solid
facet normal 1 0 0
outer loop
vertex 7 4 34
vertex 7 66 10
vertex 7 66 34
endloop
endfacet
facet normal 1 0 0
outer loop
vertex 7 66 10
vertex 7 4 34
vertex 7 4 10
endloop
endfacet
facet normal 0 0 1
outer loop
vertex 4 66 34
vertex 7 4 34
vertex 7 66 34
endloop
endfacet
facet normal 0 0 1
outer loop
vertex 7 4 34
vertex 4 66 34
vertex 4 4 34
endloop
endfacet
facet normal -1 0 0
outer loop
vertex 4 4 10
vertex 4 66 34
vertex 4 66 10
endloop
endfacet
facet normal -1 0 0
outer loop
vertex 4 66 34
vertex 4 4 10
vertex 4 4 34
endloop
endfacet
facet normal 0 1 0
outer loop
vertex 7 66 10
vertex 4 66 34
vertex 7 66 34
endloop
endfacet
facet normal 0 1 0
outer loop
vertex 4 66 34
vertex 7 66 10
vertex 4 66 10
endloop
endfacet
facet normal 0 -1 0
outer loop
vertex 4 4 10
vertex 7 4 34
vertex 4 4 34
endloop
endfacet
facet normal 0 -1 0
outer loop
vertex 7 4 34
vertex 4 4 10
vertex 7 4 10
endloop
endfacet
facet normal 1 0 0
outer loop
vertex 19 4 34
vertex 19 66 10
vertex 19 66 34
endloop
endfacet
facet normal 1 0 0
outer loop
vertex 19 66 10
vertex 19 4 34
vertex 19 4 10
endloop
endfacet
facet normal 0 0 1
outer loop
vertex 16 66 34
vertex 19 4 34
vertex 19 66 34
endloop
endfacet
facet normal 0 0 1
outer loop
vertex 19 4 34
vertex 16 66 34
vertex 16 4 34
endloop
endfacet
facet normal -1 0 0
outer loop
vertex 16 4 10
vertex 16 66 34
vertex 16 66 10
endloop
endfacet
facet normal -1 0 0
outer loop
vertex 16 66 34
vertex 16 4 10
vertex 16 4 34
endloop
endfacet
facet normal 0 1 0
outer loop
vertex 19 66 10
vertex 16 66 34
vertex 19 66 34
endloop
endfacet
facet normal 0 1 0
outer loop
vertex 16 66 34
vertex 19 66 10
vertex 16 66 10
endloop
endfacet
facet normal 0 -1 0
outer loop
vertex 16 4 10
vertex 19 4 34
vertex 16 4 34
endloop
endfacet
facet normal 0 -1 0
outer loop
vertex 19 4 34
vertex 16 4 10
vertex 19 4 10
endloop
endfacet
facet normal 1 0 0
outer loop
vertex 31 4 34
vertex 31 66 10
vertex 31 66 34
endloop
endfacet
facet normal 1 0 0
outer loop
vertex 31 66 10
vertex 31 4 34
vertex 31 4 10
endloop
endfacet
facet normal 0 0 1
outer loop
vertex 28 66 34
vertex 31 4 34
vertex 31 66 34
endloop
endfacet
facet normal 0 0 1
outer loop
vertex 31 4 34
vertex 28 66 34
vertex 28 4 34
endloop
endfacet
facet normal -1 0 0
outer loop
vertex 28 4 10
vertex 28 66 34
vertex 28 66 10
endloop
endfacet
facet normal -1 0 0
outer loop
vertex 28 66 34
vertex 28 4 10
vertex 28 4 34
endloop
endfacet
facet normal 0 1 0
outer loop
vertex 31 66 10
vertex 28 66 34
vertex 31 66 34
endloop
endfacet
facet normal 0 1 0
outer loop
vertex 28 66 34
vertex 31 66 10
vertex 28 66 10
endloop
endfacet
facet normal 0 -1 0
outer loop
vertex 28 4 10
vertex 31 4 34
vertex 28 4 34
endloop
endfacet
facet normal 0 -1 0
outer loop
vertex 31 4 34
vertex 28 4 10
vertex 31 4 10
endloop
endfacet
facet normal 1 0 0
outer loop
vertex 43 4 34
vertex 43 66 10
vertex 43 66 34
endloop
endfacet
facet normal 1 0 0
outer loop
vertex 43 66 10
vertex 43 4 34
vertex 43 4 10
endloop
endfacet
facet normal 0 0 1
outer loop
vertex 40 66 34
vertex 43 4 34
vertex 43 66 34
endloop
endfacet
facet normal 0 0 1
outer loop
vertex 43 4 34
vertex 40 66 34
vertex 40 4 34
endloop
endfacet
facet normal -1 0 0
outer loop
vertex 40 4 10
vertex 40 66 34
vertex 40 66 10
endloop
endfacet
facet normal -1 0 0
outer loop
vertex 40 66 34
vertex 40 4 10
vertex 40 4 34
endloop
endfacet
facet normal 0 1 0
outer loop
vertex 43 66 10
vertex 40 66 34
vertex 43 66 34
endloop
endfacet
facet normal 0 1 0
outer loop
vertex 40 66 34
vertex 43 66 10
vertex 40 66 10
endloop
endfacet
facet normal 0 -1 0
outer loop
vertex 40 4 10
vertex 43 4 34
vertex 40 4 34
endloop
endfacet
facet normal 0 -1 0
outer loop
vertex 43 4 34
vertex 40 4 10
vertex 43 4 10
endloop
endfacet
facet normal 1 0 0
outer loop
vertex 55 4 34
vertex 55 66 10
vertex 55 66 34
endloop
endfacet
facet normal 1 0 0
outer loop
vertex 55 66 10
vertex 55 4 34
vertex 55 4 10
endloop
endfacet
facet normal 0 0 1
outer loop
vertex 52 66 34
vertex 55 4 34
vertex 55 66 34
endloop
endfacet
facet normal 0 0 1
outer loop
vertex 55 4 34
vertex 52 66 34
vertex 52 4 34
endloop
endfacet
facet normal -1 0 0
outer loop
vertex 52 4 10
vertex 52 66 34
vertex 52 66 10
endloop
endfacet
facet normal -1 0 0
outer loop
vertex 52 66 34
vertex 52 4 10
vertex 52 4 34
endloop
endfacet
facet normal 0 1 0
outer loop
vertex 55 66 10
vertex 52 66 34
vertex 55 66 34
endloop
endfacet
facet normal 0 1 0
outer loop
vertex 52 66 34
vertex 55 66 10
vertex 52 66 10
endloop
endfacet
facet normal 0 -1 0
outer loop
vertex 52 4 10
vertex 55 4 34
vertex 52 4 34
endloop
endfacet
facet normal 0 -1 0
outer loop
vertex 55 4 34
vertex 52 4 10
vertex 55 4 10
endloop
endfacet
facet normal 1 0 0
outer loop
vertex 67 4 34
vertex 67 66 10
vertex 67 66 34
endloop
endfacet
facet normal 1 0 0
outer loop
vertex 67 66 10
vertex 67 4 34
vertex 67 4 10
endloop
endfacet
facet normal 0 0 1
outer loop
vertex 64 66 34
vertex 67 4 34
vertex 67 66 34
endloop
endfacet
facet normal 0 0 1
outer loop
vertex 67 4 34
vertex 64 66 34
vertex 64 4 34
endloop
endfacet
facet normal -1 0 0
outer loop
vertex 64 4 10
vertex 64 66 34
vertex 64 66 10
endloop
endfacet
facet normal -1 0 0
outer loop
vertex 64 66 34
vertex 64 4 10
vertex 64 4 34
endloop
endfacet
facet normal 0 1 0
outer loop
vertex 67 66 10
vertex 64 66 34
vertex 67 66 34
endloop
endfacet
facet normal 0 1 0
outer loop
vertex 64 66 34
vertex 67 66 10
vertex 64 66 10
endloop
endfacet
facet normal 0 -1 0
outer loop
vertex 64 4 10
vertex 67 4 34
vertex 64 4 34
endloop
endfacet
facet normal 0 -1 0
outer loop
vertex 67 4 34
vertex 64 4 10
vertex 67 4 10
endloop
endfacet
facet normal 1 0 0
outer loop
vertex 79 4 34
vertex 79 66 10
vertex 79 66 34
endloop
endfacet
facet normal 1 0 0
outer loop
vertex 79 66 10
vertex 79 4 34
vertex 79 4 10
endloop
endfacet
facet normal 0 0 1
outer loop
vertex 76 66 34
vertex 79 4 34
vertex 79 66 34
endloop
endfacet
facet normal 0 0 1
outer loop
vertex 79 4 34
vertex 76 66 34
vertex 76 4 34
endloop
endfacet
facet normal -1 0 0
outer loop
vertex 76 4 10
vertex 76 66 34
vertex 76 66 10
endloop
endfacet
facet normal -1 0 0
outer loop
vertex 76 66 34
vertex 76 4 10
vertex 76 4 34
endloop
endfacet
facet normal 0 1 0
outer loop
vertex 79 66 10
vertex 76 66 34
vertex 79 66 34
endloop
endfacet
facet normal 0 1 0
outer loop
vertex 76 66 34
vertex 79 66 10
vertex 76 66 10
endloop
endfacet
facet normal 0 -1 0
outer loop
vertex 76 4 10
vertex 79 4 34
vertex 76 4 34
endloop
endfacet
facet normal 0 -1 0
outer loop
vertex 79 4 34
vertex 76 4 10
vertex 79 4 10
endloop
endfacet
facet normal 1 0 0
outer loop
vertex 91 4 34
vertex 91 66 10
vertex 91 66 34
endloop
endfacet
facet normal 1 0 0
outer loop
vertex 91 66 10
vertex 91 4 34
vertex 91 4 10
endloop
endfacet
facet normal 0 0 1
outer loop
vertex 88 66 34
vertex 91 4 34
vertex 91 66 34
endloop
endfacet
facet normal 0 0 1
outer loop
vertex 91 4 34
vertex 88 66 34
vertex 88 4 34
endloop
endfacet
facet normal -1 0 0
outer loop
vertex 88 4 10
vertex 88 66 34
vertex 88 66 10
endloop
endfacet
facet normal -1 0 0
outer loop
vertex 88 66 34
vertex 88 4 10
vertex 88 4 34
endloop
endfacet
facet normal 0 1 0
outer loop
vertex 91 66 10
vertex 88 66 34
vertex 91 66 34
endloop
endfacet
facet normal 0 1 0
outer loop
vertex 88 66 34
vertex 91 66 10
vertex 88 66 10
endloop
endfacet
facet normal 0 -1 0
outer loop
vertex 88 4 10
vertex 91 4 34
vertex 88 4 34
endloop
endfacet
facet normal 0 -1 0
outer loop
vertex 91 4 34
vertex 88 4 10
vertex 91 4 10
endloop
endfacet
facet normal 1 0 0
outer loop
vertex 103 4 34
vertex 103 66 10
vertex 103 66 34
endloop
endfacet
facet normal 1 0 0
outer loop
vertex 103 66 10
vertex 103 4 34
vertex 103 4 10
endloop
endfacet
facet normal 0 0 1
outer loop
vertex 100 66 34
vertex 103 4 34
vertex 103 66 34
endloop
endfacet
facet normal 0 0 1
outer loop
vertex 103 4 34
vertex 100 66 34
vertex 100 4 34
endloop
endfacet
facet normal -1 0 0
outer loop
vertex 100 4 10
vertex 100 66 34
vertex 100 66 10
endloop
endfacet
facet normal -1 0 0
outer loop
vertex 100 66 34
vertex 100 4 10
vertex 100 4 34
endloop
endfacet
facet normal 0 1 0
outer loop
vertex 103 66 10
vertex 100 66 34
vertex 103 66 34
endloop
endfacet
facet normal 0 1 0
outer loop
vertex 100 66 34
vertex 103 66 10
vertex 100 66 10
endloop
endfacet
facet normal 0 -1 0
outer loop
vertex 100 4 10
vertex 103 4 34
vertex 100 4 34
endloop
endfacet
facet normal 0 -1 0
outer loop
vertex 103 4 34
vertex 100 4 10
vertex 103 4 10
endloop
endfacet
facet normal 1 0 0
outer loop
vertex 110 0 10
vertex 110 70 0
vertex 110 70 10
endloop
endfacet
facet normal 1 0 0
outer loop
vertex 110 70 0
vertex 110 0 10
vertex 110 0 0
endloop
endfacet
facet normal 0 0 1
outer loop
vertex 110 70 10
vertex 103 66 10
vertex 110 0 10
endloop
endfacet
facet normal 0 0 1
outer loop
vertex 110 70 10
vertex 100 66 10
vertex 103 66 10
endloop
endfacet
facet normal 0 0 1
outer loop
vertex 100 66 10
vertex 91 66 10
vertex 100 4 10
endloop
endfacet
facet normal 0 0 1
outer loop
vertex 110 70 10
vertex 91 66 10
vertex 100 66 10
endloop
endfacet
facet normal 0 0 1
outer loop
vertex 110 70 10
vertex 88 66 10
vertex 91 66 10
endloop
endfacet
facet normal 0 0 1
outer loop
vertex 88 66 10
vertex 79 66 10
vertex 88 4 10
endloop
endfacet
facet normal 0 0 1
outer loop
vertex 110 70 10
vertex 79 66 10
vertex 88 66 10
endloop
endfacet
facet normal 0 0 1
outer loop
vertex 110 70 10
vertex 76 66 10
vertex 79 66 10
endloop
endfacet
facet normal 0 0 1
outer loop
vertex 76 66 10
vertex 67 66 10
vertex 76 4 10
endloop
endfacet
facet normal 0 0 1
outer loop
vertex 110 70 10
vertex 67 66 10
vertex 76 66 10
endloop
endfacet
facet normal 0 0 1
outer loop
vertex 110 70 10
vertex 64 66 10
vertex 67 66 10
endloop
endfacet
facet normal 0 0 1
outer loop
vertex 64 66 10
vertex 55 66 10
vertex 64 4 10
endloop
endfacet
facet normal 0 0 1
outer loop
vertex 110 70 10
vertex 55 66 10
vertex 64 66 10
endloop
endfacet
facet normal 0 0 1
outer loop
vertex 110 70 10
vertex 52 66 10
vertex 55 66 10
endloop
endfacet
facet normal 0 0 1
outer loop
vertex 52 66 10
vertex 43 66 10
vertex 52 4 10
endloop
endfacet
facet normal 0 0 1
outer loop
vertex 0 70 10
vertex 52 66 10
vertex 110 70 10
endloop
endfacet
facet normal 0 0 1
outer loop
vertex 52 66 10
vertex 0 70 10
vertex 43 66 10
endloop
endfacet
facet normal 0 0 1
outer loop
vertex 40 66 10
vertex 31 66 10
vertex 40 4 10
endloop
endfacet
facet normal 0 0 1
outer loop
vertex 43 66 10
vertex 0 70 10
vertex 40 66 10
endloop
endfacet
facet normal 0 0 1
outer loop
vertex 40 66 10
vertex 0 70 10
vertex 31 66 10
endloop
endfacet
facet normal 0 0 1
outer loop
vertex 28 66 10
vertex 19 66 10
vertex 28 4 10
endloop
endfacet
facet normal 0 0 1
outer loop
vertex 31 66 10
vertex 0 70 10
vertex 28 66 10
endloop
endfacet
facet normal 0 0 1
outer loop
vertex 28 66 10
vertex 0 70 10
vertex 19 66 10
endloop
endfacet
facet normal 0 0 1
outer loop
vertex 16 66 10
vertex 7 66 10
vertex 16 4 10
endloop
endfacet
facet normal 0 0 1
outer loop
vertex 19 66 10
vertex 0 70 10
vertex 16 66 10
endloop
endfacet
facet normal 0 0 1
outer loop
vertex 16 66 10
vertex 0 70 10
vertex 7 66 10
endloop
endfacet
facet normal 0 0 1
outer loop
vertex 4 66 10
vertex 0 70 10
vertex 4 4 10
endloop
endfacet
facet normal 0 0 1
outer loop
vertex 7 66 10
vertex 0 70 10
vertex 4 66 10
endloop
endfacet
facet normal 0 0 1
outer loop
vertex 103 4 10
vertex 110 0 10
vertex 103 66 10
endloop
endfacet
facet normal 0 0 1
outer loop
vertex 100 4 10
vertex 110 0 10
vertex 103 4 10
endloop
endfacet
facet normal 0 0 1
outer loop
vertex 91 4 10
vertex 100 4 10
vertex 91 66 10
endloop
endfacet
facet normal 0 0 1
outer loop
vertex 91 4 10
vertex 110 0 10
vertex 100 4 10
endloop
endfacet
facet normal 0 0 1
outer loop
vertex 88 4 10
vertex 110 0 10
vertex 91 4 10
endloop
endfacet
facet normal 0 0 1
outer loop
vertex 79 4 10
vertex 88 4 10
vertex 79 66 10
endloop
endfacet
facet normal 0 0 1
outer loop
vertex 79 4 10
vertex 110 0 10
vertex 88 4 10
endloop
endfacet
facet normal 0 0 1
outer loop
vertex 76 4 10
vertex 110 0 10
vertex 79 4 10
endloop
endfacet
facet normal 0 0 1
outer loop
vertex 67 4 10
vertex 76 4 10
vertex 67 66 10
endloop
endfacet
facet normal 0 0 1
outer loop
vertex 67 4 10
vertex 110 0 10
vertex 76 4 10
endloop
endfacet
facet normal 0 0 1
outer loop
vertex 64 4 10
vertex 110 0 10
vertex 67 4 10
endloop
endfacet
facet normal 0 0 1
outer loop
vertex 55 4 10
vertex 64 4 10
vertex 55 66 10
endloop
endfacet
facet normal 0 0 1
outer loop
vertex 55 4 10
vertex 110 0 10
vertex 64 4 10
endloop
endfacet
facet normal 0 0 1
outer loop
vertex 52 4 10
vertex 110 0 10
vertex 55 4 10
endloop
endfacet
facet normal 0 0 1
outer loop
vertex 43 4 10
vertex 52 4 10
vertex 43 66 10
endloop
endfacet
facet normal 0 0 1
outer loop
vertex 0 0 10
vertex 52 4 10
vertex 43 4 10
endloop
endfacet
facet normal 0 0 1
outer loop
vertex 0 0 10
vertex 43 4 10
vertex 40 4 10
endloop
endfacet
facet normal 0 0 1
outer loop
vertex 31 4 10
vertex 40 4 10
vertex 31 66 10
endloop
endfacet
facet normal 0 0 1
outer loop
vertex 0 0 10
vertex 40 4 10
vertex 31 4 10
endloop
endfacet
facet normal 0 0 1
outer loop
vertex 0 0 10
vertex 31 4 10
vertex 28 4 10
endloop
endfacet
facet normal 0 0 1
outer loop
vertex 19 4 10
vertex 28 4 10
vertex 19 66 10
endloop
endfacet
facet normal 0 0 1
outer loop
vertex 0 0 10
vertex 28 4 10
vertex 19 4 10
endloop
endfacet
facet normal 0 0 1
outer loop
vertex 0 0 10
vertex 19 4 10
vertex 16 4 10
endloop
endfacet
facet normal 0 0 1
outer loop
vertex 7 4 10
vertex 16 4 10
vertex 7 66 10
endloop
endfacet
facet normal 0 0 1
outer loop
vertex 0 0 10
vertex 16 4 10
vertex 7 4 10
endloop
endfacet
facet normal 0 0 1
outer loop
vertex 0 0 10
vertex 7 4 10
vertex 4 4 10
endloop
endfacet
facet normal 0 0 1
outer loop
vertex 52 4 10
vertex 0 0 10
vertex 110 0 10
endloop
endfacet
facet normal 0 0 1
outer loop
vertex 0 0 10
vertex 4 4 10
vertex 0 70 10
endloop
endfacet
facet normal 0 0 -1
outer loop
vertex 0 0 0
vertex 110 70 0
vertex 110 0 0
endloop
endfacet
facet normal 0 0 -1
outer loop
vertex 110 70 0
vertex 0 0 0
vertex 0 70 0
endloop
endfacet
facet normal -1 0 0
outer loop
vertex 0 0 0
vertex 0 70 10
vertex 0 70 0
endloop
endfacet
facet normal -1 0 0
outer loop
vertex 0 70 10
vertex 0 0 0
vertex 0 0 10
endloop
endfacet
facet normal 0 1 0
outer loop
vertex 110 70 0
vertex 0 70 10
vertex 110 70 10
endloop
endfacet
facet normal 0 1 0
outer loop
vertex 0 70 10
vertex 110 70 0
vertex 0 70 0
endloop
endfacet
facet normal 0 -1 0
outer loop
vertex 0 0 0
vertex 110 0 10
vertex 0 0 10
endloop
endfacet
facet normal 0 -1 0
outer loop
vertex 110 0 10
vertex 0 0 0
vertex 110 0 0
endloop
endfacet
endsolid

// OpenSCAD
$fn = 32;

// ----------------------------------------------------------------------
// Heatsink: uniform fin block
// ----------------------------------------------------------------------

// --- parameters (mm) ---
base_l = 110;             // base length, X
base_w = 70;              // base width, Y
base_t = 10;              // base plate thickness
fin_h = 25;               // fin height above the base
fin_t = 3;                // fin thickness
edge = 4;                 // margin from the base ends
pitch = 12;               // fin pitch

n_fins = floor((base_l - 2 * edge - fin_t) / pitch) + 1;  // fin count
total_h = base_t + fin_h - 1;  // overall height

union() {
  cube([base_l, base_w, base_t]);
  for (i = [0 : n_fins - 1])
    translate([edge + i * pitch, edge, base_t - 1])
      cube([fin_t, base_w - 2 * edge, fin_h]);
}
